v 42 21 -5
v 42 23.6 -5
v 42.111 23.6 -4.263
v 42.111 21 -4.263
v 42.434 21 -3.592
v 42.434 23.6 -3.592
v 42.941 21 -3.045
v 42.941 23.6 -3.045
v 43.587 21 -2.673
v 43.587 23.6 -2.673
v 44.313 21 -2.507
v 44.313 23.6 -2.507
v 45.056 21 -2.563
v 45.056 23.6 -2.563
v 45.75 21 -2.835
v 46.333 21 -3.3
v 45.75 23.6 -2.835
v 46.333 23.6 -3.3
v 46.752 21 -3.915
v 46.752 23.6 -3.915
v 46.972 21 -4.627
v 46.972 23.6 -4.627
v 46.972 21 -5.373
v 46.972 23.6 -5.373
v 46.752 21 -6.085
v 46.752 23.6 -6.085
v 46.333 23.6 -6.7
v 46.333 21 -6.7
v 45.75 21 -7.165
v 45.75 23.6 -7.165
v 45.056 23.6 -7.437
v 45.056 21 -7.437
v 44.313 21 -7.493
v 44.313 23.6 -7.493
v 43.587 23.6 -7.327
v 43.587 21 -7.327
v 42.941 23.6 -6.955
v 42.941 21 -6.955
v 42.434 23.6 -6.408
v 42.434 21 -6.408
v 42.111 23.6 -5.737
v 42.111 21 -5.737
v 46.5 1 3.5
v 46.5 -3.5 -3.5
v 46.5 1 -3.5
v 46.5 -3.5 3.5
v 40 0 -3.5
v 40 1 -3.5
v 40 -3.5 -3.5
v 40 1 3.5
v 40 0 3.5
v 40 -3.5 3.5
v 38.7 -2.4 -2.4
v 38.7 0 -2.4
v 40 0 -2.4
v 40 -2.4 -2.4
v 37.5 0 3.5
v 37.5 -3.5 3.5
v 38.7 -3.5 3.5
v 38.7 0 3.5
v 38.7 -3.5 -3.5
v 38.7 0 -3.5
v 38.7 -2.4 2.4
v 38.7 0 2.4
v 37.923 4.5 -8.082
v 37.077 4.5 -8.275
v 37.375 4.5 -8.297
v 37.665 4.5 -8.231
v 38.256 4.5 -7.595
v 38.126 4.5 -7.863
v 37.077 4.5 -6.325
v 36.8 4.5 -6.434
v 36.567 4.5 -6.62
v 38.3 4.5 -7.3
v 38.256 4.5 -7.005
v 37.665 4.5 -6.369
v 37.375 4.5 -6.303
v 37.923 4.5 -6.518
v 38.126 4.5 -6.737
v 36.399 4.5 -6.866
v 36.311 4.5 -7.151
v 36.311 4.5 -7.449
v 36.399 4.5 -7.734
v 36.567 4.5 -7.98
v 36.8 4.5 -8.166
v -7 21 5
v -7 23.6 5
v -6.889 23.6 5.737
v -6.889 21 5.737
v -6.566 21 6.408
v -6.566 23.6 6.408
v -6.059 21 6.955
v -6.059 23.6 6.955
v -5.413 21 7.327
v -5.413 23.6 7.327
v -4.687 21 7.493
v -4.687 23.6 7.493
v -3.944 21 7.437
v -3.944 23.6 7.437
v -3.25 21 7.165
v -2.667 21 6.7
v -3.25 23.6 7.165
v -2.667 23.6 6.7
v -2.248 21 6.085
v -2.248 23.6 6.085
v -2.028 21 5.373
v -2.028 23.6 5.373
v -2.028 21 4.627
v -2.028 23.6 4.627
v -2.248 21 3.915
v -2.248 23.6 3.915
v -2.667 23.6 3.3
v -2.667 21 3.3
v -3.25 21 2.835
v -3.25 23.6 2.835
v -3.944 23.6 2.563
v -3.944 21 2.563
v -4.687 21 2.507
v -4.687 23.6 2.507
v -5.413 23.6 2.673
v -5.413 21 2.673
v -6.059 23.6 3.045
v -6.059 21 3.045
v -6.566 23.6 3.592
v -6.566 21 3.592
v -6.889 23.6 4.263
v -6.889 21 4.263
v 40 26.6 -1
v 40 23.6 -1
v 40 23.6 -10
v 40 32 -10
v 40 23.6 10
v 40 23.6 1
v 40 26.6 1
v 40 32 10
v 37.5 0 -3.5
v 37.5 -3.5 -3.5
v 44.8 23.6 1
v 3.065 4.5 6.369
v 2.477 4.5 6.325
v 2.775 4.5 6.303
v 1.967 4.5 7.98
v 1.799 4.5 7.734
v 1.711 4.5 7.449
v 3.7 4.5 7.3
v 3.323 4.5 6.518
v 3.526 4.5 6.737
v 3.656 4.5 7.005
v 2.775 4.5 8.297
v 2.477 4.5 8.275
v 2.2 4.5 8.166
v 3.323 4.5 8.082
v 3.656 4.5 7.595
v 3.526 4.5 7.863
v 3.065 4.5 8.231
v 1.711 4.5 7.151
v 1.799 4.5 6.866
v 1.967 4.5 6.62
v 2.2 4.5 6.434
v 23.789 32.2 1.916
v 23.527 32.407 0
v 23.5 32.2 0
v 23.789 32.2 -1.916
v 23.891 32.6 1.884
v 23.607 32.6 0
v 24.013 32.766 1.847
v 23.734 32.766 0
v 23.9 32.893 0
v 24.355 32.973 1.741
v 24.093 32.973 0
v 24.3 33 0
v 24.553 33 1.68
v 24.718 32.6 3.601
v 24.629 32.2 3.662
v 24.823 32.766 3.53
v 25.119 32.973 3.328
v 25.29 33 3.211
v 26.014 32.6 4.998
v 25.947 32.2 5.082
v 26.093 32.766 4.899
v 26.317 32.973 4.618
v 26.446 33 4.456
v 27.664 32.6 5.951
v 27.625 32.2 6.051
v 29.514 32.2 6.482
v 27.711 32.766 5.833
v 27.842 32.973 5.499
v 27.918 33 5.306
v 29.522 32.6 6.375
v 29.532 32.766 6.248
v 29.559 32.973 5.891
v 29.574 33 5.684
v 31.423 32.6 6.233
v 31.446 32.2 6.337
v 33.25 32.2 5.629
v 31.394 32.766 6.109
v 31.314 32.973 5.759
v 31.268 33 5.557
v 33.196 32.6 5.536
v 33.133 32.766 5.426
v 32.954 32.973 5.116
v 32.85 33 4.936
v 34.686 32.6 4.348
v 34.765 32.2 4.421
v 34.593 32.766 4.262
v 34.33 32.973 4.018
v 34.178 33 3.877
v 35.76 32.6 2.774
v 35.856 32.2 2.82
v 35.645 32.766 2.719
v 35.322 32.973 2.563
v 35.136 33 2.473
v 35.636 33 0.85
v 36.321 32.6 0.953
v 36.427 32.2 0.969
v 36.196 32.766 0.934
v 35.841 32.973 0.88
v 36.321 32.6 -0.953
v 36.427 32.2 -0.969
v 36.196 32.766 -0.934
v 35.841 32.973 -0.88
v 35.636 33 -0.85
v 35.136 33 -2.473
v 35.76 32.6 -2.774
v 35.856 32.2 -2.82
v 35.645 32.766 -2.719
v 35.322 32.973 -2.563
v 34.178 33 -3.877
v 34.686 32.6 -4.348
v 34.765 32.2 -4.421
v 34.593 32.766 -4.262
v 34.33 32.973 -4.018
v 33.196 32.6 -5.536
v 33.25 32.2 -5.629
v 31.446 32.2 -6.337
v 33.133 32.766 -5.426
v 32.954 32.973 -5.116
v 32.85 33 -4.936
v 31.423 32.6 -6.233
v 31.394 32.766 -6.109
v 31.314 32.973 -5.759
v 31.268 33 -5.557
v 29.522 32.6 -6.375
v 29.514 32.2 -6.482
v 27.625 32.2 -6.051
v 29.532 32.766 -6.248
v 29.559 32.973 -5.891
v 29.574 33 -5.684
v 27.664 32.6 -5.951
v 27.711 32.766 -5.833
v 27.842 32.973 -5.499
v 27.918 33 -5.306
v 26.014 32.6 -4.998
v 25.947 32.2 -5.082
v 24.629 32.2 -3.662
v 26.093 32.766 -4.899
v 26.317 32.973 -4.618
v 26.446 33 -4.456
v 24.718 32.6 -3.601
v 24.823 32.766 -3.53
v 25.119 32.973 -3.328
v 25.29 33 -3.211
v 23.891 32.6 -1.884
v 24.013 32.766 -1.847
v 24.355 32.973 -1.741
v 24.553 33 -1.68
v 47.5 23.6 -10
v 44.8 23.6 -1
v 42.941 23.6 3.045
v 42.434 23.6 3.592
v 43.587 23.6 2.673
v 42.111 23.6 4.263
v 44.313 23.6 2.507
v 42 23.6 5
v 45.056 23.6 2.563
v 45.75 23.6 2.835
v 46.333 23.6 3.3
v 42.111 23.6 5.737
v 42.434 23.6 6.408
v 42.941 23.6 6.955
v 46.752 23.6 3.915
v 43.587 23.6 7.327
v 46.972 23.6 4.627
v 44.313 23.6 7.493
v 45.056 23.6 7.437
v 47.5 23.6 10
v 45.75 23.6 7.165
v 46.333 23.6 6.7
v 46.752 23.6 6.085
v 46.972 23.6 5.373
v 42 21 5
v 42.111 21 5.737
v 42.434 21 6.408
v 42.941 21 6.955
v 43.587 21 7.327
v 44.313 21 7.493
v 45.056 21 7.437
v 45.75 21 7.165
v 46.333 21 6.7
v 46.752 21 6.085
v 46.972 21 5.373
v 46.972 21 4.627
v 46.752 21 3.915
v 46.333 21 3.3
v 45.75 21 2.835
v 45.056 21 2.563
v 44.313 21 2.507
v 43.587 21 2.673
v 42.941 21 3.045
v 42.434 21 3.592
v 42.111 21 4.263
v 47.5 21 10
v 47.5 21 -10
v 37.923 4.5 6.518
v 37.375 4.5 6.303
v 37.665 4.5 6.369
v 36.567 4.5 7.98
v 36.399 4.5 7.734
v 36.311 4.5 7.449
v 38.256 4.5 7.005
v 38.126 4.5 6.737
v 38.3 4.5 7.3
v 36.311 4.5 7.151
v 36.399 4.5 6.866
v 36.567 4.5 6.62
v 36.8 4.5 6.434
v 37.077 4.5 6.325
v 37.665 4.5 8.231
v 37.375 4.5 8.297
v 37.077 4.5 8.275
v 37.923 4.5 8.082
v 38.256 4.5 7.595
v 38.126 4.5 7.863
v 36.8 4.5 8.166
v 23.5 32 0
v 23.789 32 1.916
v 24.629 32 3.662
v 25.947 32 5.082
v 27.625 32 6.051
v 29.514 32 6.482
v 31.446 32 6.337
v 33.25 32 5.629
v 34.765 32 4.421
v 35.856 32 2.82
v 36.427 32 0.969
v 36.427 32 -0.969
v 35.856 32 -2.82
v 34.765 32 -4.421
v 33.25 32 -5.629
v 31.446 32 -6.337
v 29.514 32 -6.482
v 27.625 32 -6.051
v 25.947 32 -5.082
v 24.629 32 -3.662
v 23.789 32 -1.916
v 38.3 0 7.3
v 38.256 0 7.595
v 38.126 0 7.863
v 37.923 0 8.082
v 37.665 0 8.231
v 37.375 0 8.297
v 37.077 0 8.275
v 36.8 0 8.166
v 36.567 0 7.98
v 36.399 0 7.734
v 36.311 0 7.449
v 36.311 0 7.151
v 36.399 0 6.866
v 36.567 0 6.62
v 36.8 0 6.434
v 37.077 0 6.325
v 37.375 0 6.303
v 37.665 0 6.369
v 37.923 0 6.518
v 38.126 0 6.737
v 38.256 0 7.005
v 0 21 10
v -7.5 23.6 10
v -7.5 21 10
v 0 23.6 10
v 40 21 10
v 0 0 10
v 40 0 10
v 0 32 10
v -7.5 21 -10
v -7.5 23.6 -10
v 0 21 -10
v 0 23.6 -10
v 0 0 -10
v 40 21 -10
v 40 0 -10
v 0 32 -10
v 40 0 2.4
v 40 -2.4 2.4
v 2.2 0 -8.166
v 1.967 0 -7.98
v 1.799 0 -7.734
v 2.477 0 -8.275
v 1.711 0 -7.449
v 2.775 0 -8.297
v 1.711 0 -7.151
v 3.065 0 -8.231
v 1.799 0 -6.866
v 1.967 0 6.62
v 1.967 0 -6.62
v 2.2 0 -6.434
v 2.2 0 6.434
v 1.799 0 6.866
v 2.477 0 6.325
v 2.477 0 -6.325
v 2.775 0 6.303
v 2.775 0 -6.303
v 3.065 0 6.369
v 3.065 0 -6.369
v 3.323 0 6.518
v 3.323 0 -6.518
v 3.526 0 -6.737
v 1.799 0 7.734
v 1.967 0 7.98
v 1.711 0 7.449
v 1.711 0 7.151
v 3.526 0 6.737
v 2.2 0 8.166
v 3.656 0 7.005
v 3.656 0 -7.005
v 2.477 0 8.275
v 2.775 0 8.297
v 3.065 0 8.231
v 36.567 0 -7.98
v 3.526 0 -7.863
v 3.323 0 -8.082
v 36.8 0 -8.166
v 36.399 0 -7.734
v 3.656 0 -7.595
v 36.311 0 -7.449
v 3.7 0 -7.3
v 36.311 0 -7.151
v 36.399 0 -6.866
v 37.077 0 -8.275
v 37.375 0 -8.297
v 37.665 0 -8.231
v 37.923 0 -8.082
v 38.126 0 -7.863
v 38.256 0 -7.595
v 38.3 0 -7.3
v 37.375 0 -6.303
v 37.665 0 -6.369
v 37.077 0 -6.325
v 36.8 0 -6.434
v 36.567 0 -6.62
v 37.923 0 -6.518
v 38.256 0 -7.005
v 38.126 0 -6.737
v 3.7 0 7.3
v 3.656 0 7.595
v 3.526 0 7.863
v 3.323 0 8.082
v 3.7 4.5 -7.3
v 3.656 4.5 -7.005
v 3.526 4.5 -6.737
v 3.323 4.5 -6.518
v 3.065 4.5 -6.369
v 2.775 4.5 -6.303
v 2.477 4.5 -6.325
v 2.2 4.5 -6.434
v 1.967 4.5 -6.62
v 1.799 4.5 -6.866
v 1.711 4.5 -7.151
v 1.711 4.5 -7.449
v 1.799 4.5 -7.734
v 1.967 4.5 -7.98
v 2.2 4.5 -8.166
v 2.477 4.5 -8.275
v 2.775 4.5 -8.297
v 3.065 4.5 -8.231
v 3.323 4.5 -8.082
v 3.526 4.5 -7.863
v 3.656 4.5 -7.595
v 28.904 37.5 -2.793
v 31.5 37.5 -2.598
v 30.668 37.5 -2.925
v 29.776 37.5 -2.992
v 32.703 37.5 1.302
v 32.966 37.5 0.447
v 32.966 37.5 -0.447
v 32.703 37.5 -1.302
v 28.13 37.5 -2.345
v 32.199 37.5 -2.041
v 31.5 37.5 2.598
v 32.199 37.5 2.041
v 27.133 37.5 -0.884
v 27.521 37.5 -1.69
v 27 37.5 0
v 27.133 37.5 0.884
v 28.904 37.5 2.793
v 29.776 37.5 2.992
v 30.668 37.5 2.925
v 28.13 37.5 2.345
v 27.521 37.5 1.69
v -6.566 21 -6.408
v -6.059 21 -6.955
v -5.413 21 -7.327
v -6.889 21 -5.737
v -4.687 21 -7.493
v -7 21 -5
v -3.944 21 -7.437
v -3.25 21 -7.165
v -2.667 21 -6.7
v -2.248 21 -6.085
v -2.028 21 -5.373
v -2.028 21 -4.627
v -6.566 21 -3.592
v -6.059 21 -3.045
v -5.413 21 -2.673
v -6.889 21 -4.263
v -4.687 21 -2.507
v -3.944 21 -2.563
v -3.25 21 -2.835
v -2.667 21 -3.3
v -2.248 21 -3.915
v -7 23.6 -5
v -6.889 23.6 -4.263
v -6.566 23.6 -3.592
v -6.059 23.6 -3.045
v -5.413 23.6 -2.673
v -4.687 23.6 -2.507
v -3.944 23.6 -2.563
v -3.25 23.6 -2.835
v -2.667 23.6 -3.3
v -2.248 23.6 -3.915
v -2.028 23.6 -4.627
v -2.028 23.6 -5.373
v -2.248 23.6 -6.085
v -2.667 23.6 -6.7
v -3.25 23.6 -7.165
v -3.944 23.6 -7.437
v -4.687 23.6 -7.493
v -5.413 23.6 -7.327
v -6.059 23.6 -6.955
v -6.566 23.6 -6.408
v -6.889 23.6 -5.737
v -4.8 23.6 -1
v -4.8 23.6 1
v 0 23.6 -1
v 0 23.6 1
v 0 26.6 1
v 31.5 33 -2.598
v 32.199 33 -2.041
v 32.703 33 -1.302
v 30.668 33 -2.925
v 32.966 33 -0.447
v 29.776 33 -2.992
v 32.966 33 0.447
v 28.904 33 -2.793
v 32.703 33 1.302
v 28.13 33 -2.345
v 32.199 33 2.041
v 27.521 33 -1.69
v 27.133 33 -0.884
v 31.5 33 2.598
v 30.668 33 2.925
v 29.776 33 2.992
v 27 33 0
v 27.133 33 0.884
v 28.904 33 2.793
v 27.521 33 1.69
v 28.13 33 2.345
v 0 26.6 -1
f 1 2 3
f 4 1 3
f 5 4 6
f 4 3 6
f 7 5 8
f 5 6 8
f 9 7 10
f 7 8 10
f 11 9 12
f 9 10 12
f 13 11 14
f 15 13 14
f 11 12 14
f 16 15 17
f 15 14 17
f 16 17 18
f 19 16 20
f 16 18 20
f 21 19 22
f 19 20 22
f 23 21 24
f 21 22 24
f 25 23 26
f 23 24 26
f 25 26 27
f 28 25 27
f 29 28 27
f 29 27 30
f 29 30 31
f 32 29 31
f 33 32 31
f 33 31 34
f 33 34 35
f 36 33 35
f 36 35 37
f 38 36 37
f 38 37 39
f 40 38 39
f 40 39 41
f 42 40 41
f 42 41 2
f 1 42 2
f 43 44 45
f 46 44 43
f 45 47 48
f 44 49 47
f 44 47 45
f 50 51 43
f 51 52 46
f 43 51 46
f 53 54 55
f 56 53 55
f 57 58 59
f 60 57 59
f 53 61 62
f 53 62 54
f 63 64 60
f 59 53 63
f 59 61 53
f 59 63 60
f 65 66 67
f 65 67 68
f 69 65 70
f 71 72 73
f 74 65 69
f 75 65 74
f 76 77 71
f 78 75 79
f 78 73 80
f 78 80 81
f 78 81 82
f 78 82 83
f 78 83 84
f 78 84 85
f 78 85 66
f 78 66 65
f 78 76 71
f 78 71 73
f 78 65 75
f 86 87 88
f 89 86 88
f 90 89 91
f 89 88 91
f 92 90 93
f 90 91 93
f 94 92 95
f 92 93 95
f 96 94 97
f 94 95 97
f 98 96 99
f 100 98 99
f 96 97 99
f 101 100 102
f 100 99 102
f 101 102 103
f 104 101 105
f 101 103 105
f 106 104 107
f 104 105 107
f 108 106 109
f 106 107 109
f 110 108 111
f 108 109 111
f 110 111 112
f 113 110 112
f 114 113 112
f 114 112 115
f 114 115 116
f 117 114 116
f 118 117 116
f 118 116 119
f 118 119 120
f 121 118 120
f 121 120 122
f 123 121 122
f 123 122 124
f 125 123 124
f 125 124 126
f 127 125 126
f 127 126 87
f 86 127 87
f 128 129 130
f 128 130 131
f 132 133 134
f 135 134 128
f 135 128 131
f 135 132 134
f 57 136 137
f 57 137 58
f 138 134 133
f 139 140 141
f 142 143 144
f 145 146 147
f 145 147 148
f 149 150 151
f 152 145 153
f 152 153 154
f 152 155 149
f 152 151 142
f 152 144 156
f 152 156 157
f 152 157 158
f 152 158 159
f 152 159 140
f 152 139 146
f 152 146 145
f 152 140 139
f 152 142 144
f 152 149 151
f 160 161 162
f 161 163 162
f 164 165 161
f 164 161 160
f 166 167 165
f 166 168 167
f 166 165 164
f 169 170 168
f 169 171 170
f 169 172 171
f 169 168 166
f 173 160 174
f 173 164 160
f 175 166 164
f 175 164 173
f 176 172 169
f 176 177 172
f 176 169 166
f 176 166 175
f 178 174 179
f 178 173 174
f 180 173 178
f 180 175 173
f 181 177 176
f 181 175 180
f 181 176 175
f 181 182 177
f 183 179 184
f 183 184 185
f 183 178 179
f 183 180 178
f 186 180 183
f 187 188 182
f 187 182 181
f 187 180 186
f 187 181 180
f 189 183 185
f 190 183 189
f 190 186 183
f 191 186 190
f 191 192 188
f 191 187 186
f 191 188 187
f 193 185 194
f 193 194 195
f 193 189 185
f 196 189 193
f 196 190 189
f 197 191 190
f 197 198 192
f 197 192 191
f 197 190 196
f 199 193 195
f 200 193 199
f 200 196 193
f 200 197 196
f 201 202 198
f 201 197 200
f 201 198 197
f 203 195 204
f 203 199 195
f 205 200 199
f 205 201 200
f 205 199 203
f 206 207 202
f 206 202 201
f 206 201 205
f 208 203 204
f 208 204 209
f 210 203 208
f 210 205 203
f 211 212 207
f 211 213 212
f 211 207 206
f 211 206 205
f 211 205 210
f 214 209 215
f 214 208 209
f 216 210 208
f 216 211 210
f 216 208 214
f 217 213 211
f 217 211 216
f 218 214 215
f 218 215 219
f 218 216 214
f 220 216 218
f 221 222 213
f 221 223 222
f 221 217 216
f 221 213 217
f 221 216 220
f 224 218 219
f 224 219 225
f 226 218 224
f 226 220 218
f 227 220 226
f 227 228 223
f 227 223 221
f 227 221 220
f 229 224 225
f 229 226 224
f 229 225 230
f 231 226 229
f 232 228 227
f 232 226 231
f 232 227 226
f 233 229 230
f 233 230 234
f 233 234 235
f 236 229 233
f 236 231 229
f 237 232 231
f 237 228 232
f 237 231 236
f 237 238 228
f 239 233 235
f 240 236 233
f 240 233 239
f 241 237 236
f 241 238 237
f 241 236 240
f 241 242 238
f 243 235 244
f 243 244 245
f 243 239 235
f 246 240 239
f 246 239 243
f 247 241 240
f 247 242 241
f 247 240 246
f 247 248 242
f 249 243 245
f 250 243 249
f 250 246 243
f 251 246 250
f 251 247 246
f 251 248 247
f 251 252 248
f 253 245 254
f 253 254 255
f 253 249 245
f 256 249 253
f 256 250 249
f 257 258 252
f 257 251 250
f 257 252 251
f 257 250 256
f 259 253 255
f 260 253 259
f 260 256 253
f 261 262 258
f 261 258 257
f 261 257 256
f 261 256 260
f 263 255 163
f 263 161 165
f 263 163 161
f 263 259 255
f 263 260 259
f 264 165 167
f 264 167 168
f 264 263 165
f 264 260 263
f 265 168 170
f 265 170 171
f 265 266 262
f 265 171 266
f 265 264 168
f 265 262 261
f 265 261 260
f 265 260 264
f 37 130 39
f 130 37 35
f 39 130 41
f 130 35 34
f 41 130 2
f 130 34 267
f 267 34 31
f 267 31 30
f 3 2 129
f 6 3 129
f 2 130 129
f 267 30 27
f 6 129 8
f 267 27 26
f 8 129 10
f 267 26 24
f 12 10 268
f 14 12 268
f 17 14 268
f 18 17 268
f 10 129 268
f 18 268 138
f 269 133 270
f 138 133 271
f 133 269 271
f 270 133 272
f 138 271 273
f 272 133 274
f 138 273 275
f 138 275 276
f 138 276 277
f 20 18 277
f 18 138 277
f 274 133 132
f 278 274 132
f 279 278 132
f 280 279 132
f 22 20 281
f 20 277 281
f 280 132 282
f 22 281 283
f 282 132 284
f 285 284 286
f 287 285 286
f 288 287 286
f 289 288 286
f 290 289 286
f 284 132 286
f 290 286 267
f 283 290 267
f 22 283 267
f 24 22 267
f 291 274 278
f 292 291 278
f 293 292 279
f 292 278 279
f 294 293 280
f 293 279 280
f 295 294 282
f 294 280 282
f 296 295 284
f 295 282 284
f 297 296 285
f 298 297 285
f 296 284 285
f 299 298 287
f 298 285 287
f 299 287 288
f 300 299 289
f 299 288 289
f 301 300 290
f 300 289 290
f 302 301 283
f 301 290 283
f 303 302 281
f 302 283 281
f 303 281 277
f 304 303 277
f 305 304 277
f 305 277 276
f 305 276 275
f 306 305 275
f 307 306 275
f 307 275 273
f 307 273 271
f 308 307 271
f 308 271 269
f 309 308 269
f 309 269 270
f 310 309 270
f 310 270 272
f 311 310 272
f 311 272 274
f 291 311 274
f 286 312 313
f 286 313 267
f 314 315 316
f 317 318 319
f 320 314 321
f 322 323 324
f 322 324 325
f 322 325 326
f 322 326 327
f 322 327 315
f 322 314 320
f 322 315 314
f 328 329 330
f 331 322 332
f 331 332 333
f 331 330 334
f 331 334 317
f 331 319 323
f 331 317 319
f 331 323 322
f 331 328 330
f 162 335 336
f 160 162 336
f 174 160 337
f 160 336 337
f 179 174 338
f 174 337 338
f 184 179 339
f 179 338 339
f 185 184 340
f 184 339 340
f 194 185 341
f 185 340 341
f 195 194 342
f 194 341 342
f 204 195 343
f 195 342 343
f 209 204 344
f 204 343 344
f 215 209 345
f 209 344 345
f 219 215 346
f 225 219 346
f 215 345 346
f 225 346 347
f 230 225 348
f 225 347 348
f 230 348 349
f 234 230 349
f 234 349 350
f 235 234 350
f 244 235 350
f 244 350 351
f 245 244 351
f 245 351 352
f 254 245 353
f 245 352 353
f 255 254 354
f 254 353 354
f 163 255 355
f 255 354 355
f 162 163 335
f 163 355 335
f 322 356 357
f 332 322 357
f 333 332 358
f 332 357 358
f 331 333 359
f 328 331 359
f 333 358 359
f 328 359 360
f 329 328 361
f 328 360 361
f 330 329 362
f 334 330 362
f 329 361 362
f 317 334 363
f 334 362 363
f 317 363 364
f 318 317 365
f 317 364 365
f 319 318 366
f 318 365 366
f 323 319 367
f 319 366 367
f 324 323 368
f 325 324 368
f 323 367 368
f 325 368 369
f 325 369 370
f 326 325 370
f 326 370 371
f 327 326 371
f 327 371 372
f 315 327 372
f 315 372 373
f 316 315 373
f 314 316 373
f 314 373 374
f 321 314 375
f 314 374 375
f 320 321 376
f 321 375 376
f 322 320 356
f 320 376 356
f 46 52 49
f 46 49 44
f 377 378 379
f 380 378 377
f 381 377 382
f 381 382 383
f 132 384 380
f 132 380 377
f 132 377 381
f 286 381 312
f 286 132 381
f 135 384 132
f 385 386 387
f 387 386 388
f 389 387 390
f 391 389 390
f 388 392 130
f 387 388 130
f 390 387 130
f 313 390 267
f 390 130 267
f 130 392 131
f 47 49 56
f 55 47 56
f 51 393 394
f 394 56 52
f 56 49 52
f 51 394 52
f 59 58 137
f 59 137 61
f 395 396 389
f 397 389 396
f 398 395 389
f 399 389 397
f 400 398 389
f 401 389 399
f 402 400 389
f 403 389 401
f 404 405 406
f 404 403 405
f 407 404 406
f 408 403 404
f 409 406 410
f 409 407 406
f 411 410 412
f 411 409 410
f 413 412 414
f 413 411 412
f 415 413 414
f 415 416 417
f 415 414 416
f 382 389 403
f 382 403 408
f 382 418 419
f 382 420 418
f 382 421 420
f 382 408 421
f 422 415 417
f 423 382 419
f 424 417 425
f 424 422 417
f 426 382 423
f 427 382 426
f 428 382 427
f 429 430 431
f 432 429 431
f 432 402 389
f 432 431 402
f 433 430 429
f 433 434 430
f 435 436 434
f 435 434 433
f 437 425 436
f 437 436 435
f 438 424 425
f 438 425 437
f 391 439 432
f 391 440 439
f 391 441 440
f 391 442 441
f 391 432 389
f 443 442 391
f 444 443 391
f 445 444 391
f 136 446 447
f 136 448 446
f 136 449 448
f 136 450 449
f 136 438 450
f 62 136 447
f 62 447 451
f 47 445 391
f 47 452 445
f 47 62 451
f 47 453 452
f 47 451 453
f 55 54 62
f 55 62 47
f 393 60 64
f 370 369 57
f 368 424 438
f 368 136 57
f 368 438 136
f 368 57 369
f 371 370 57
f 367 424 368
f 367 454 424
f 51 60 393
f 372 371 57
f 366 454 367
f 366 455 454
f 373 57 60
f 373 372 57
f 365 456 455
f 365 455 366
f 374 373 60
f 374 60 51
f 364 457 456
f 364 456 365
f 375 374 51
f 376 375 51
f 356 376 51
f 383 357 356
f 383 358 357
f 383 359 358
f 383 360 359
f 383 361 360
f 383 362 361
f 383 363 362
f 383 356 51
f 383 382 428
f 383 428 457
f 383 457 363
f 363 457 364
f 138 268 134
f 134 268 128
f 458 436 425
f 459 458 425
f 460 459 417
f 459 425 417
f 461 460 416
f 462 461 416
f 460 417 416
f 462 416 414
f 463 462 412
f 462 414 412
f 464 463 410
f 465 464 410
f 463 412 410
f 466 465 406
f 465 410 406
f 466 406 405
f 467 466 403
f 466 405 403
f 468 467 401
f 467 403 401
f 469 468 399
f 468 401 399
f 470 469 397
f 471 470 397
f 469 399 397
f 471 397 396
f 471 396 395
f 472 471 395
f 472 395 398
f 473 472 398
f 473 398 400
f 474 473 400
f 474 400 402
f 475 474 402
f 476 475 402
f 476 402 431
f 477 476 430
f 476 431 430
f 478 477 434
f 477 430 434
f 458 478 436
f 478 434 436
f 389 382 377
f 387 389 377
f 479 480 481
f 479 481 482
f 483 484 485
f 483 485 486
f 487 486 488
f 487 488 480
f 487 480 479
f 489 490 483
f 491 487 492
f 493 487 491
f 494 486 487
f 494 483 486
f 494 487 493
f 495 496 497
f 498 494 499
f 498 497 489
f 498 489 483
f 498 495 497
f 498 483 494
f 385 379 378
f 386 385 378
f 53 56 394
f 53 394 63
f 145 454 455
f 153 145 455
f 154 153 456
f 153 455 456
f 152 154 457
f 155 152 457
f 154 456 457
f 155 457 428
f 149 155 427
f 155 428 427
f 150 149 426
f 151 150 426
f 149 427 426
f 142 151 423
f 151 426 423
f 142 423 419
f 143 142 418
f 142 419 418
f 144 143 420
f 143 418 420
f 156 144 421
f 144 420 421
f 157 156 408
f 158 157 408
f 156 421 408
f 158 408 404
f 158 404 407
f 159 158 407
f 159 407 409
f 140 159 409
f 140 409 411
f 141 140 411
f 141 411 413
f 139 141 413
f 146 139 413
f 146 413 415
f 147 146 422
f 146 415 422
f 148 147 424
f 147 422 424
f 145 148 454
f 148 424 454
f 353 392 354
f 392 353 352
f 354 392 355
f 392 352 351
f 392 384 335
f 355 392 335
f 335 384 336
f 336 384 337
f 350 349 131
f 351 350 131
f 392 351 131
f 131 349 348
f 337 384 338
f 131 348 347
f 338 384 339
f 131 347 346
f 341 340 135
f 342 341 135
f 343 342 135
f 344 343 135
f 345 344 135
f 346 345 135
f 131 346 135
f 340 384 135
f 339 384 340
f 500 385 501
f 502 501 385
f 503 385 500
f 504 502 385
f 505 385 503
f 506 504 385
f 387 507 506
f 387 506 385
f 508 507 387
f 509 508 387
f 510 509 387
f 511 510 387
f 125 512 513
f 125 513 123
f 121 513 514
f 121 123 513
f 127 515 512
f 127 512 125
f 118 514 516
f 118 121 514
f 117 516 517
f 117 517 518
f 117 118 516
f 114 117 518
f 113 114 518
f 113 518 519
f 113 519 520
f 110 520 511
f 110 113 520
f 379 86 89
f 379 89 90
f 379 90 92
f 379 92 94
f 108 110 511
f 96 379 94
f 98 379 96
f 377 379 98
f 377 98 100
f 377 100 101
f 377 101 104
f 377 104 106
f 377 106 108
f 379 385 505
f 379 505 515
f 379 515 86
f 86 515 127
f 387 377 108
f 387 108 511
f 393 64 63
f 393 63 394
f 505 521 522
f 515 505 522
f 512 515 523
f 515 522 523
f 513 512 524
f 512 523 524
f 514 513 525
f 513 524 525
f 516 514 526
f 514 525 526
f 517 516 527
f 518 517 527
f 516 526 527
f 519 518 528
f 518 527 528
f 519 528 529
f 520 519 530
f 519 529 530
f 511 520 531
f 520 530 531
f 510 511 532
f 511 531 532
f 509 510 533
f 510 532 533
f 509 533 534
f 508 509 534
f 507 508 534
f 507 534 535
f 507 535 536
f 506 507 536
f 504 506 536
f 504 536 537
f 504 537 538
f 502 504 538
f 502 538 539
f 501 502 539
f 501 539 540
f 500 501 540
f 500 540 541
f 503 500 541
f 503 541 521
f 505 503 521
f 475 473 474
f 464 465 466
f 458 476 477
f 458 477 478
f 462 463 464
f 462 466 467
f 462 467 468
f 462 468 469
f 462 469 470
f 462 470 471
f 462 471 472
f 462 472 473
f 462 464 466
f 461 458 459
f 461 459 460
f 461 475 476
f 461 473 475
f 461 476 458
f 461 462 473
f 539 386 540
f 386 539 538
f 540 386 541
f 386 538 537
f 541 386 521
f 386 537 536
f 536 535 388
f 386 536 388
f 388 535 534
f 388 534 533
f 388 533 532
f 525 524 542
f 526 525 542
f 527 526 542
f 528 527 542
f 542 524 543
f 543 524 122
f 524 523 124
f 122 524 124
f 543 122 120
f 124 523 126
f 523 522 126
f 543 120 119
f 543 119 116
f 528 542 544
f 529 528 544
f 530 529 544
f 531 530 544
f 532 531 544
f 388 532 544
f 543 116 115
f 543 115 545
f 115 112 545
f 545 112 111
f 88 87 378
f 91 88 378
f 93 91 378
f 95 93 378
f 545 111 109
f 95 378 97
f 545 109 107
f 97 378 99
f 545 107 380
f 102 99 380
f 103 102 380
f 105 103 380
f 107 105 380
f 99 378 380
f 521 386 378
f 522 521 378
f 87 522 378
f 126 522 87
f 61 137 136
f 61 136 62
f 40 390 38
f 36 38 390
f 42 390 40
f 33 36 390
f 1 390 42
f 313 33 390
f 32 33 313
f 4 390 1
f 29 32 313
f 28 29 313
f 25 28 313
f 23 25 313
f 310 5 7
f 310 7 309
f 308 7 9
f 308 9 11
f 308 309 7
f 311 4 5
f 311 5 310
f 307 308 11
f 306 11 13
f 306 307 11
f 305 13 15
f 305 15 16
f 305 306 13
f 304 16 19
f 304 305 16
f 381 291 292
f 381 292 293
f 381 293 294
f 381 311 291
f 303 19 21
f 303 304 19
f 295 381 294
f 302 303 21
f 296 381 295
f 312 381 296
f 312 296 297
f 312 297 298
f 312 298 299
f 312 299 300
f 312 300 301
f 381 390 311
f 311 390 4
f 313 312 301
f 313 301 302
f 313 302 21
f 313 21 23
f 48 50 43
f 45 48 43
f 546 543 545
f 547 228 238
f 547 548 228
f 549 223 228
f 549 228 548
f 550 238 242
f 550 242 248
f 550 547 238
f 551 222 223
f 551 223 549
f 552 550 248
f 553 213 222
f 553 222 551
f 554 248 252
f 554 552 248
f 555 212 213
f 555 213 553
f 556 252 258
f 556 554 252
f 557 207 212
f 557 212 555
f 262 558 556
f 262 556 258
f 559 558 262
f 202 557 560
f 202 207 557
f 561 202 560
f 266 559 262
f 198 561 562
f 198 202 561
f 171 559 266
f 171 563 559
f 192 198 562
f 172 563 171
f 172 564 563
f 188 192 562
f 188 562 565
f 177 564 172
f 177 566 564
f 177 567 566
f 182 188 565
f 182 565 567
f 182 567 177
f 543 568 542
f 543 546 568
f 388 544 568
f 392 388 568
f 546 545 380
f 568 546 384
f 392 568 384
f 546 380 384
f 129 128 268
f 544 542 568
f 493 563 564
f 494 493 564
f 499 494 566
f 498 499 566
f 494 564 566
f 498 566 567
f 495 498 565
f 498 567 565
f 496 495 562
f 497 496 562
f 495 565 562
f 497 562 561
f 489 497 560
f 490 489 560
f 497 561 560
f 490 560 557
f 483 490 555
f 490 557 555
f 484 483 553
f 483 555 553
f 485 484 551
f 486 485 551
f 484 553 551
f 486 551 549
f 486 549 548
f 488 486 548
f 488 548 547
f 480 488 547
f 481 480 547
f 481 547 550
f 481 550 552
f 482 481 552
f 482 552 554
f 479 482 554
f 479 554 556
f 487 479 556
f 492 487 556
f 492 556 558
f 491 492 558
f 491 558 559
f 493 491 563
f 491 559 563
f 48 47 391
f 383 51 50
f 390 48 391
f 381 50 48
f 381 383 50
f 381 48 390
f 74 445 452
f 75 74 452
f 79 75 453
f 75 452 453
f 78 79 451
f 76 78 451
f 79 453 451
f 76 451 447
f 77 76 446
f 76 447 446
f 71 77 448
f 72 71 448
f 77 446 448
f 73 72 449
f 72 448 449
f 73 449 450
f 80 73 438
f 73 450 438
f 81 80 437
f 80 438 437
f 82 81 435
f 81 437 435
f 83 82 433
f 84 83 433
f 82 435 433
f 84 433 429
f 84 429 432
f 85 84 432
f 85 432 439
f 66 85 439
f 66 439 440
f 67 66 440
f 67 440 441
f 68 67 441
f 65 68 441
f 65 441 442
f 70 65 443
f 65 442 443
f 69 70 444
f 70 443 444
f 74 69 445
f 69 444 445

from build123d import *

# Parameters (mm, degrees)
ESQUISSE1_W             = 40
ESQUISSE1_H             = 32
EXTRUSION1_DEPTH        = 10
ESQUISSE2_R             = 6.5
EXTRUSION2_DEPTH        = 1
CONG_1_R                = 0.8
ESQUISSE3_R             = 3
EXTRUSION3_DEPTH        = 4.5
ESQUISSE4_W             = 9
ESQUISSE4_H             = 7
EXTRUSION4_DEPTH        = 3.5
EXTRUSION4_DEPTH_BACK   = 1
ESQUISSE5_W             = 1.3
ESQUISSE5_H             = 1.1
ENL_V_MAT_EXTRU_2_DEPTH = 3.5
ENL_V_MAT_EXTRU_5_REACH = 14.4
ESQUISSE9_W             = 1.3
ESQUISSE9_H             = 1.1
ESQUISSE7_R             = 1
ENL_V_MAT_EXTRU_4_DEPTH = 4.5
ESQUISSE8_W             = 7.5
ESQUISSE8_H             = 2.6
EXTRUSION6_DEPTH        = 20
EXTRUSION7_DEPTH        = 1
ENL_V_MAT_EXTRU_6_REACH = 29.1
ESQUISSE11_R            = 2.5


with BuildPart() as part:
    # Esquisse1 → Extrusion1 (new body, symmetric)
    with BuildSketch(Plane.XY):
        with Locations((20, 16)):
            Rectangle(ESQUISSE1_W, ESQUISSE1_H)
    extrude(amount=EXTRUSION1_DEPTH, both=True)

    # Esquisse2 → Extrusion2 (add)
    with BuildSketch(Plane(origin=(0, 32, 0), x_dir=(-1, 0, 0), z_dir=(0, 1, 0))):
        with Locations((-30, 0)):
            Circle(ESQUISSE2_R)
    extrude(amount=EXTRUSION2_DEPTH)

    # Cong_1
    cong_1_edges = [part.edges().sort_by_distance(p)[0] for p in [
        (36.5, 33, 0),
    ]]
    fillet(cong_1_edges, radius=CONG_1_R)

    # Esquisse3 → Extrusion3 (add)
    with BuildSketch(Plane(origin=(0, 33, 0), x_dir=(-1, 0, 0), z_dir=(0, 1, 0))):
        with Locations((-30, 0)):
            Circle(ESQUISSE3_R)
    extrude(amount=EXTRUSION3_DEPTH)

    # Esquisse4 → Extrusion4 (add, two sides)
    with BuildSketch(Plane.XZ) as extrusion4_sk:
        with Locations((42, 0)):
            Rectangle(ESQUISSE4_W, ESQUISSE4_H)
    extrude(amount=EXTRUSION4_DEPTH)
    extrude(extrusion4_sk.sketch, amount=-EXTRUSION4_DEPTH_BACK)

    # Esquisse5 → Enl_v. mat.-Extru.2 (cut)
    with BuildSketch(Plane.XZ.offset(3.5)):
        with Locations((39.35, 2.95)):
            Rectangle(ESQUISSE5_W, ESQUISSE5_H)
        with Locations((39.35, -2.95)):
            Rectangle(ESQUISSE5_W, ESQUISSE5_H)
    extrude(amount=-ENL_V_MAT_EXTRU_2_DEPTH, mode=Mode.SUBTRACT)

    # Esquisse9 → Enl_v. mat.-Extru.5 (cut, up to next)
    with BuildSketch(Plane(origin=(0, 0, -2.4), x_dir=(-1, 0, 0), z_dir=(0, 0, -1)), mode=Mode.PRIVATE) as enl_v_mat_extru_5_sk1:
        with Locations((-39.35, -2.95)):
            Rectangle(ESQUISSE9_W, ESQUISSE9_H)
    enl_v_mat_extru_5_tool1 = extrude(enl_v_mat_extru_5_sk1.sketch, amount=-ENL_V_MAT_EXTRU_5_REACH, mode=Mode.PRIVATE) & part.part
    add(enl_v_mat_extru_5_tool1.solids().sort_by_distance((39.35, -2.95, -2.4))[0], mode=Mode.SUBTRACT)

    # Esquisse7 → Enl_v. mat.-Extru.4 (cut)
    with BuildSketch(Plane.XZ):
        with Locations((37.3, -7.3)):
            Circle(ESQUISSE7_R)
        with Locations((2.7, -7.3)):
            Circle(ESQUISSE7_R)
        with Locations((2.7, 7.3)):
            Circle(ESQUISSE7_R)
        with Locations((37.3, 7.3)):
            Circle(ESQUISSE7_R)
    extrude(amount=-ENL_V_MAT_EXTRU_4_DEPTH, mode=Mode.SUBTRACT)

    # Esquisse8 → Extrusion6 (add)
    with BuildSketch(Plane.XY.offset(10)):
        with Locations((43.75, 22.3)):
            Rectangle(ESQUISSE8_W, ESQUISSE8_H)
        with Locations((-3.75, 22.3)):
            Rectangle(ESQUISSE8_W, ESQUISSE8_H)
    extrude(amount=-EXTRUSION6_DEPTH)

    # Esquisse10 → Extrusion7 (add, symmetric)
    with BuildSketch(Plane.XY):
        Polygon((40, 26.6), (40, 23.6), (44.8, 23.6), align=None)
        Polygon((-4.8, 23.6), (0, 23.6), (0, 26.6), align=None)
    extrude(amount=EXTRUSION7_DEPTH, both=True)

    # Esquisse11 → Enl_v. mat.-Extru.6 (cut, up to next)
    with BuildSketch(Plane(origin=(0, 23.6, 0), x_dir=(-1, 0, 0), z_dir=(0, 1, 0)), mode=Mode.PRIVATE) as enl_v_mat_extru_6_sk1:
        with Locations((-44.5, 5)):
            Circle(ESQUISSE11_R)
    enl_v_mat_extru_6_tool1 = extrude(enl_v_mat_extru_6_sk1.sketch, amount=-ENL_V_MAT_EXTRU_6_REACH, mode=Mode.PRIVATE) & part.part
    add(enl_v_mat_extru_6_tool1.solids().sort_by_distance((44.5, 23.6, 5))[0], mode=Mode.SUBTRACT)
    # Esquisse11 → Enl_v. mat.-Extru.6 (cut, up to next)
    with BuildSketch(Plane(origin=(0, 23.6, 0), x_dir=(-1, 0, 0), z_dir=(0, 1, 0)), mode=Mode.PRIVATE) as enl_v_mat_extru_6_sk2:
        with Locations((-44.5, -5)):
            Circle(ESQUISSE11_R)
    enl_v_mat_extru_6_tool2 = extrude(enl_v_mat_extru_6_sk2.sketch, amount=-ENL_V_MAT_EXTRU_6_REACH, mode=Mode.PRIVATE) & part.part
    add(enl_v_mat_extru_6_tool2.solids().sort_by_distance((44.5, 23.6, -5))[0], mode=Mode.SUBTRACT)
    # Esquisse11 → Enl_v. mat.-Extru.6 (cut, up to next)
    with BuildSketch(Plane(origin=(0, 23.6, 0), x_dir=(-1, 0, 0), z_dir=(0, 1, 0)), mode=Mode.PRIVATE) as enl_v_mat_extru_6_sk3:
        with Locations((4.5, -5)):
            Circle(ESQUISSE11_R)
    enl_v_mat_extru_6_tool3 = extrude(enl_v_mat_extru_6_sk3.sketch, amount=-ENL_V_MAT_EXTRU_6_REACH, mode=Mode.PRIVATE) & part.part
    add(enl_v_mat_extru_6_tool3.solids().sort_by_distance((-4.5, 23.6, -5))[0], mode=Mode.SUBTRACT)
    # Esquisse11 → Enl_v. mat.-Extru.6 (cut, up to next)
    with BuildSketch(Plane(origin=(0, 23.6, 0), x_dir=(-1, 0, 0), z_dir=(0, 1, 0)), mode=Mode.PRIVATE) as enl_v_mat_extru_6_sk4:
        with Locations((4.5, 5)):
            Circle(ESQUISSE11_R)
    enl_v_mat_extru_6_tool4 = extrude(enl_v_mat_extru_6_sk4.sketch, amount=-ENL_V_MAT_EXTRU_6_REACH, mode=Mode.PRIVATE) & part.part
    add(enl_v_mat_extru_6_tool4.solids().sort_by_distance((-4.5, 23.6, 5))[0], mode=Mode.SUBTRACT)


solid = part.part
